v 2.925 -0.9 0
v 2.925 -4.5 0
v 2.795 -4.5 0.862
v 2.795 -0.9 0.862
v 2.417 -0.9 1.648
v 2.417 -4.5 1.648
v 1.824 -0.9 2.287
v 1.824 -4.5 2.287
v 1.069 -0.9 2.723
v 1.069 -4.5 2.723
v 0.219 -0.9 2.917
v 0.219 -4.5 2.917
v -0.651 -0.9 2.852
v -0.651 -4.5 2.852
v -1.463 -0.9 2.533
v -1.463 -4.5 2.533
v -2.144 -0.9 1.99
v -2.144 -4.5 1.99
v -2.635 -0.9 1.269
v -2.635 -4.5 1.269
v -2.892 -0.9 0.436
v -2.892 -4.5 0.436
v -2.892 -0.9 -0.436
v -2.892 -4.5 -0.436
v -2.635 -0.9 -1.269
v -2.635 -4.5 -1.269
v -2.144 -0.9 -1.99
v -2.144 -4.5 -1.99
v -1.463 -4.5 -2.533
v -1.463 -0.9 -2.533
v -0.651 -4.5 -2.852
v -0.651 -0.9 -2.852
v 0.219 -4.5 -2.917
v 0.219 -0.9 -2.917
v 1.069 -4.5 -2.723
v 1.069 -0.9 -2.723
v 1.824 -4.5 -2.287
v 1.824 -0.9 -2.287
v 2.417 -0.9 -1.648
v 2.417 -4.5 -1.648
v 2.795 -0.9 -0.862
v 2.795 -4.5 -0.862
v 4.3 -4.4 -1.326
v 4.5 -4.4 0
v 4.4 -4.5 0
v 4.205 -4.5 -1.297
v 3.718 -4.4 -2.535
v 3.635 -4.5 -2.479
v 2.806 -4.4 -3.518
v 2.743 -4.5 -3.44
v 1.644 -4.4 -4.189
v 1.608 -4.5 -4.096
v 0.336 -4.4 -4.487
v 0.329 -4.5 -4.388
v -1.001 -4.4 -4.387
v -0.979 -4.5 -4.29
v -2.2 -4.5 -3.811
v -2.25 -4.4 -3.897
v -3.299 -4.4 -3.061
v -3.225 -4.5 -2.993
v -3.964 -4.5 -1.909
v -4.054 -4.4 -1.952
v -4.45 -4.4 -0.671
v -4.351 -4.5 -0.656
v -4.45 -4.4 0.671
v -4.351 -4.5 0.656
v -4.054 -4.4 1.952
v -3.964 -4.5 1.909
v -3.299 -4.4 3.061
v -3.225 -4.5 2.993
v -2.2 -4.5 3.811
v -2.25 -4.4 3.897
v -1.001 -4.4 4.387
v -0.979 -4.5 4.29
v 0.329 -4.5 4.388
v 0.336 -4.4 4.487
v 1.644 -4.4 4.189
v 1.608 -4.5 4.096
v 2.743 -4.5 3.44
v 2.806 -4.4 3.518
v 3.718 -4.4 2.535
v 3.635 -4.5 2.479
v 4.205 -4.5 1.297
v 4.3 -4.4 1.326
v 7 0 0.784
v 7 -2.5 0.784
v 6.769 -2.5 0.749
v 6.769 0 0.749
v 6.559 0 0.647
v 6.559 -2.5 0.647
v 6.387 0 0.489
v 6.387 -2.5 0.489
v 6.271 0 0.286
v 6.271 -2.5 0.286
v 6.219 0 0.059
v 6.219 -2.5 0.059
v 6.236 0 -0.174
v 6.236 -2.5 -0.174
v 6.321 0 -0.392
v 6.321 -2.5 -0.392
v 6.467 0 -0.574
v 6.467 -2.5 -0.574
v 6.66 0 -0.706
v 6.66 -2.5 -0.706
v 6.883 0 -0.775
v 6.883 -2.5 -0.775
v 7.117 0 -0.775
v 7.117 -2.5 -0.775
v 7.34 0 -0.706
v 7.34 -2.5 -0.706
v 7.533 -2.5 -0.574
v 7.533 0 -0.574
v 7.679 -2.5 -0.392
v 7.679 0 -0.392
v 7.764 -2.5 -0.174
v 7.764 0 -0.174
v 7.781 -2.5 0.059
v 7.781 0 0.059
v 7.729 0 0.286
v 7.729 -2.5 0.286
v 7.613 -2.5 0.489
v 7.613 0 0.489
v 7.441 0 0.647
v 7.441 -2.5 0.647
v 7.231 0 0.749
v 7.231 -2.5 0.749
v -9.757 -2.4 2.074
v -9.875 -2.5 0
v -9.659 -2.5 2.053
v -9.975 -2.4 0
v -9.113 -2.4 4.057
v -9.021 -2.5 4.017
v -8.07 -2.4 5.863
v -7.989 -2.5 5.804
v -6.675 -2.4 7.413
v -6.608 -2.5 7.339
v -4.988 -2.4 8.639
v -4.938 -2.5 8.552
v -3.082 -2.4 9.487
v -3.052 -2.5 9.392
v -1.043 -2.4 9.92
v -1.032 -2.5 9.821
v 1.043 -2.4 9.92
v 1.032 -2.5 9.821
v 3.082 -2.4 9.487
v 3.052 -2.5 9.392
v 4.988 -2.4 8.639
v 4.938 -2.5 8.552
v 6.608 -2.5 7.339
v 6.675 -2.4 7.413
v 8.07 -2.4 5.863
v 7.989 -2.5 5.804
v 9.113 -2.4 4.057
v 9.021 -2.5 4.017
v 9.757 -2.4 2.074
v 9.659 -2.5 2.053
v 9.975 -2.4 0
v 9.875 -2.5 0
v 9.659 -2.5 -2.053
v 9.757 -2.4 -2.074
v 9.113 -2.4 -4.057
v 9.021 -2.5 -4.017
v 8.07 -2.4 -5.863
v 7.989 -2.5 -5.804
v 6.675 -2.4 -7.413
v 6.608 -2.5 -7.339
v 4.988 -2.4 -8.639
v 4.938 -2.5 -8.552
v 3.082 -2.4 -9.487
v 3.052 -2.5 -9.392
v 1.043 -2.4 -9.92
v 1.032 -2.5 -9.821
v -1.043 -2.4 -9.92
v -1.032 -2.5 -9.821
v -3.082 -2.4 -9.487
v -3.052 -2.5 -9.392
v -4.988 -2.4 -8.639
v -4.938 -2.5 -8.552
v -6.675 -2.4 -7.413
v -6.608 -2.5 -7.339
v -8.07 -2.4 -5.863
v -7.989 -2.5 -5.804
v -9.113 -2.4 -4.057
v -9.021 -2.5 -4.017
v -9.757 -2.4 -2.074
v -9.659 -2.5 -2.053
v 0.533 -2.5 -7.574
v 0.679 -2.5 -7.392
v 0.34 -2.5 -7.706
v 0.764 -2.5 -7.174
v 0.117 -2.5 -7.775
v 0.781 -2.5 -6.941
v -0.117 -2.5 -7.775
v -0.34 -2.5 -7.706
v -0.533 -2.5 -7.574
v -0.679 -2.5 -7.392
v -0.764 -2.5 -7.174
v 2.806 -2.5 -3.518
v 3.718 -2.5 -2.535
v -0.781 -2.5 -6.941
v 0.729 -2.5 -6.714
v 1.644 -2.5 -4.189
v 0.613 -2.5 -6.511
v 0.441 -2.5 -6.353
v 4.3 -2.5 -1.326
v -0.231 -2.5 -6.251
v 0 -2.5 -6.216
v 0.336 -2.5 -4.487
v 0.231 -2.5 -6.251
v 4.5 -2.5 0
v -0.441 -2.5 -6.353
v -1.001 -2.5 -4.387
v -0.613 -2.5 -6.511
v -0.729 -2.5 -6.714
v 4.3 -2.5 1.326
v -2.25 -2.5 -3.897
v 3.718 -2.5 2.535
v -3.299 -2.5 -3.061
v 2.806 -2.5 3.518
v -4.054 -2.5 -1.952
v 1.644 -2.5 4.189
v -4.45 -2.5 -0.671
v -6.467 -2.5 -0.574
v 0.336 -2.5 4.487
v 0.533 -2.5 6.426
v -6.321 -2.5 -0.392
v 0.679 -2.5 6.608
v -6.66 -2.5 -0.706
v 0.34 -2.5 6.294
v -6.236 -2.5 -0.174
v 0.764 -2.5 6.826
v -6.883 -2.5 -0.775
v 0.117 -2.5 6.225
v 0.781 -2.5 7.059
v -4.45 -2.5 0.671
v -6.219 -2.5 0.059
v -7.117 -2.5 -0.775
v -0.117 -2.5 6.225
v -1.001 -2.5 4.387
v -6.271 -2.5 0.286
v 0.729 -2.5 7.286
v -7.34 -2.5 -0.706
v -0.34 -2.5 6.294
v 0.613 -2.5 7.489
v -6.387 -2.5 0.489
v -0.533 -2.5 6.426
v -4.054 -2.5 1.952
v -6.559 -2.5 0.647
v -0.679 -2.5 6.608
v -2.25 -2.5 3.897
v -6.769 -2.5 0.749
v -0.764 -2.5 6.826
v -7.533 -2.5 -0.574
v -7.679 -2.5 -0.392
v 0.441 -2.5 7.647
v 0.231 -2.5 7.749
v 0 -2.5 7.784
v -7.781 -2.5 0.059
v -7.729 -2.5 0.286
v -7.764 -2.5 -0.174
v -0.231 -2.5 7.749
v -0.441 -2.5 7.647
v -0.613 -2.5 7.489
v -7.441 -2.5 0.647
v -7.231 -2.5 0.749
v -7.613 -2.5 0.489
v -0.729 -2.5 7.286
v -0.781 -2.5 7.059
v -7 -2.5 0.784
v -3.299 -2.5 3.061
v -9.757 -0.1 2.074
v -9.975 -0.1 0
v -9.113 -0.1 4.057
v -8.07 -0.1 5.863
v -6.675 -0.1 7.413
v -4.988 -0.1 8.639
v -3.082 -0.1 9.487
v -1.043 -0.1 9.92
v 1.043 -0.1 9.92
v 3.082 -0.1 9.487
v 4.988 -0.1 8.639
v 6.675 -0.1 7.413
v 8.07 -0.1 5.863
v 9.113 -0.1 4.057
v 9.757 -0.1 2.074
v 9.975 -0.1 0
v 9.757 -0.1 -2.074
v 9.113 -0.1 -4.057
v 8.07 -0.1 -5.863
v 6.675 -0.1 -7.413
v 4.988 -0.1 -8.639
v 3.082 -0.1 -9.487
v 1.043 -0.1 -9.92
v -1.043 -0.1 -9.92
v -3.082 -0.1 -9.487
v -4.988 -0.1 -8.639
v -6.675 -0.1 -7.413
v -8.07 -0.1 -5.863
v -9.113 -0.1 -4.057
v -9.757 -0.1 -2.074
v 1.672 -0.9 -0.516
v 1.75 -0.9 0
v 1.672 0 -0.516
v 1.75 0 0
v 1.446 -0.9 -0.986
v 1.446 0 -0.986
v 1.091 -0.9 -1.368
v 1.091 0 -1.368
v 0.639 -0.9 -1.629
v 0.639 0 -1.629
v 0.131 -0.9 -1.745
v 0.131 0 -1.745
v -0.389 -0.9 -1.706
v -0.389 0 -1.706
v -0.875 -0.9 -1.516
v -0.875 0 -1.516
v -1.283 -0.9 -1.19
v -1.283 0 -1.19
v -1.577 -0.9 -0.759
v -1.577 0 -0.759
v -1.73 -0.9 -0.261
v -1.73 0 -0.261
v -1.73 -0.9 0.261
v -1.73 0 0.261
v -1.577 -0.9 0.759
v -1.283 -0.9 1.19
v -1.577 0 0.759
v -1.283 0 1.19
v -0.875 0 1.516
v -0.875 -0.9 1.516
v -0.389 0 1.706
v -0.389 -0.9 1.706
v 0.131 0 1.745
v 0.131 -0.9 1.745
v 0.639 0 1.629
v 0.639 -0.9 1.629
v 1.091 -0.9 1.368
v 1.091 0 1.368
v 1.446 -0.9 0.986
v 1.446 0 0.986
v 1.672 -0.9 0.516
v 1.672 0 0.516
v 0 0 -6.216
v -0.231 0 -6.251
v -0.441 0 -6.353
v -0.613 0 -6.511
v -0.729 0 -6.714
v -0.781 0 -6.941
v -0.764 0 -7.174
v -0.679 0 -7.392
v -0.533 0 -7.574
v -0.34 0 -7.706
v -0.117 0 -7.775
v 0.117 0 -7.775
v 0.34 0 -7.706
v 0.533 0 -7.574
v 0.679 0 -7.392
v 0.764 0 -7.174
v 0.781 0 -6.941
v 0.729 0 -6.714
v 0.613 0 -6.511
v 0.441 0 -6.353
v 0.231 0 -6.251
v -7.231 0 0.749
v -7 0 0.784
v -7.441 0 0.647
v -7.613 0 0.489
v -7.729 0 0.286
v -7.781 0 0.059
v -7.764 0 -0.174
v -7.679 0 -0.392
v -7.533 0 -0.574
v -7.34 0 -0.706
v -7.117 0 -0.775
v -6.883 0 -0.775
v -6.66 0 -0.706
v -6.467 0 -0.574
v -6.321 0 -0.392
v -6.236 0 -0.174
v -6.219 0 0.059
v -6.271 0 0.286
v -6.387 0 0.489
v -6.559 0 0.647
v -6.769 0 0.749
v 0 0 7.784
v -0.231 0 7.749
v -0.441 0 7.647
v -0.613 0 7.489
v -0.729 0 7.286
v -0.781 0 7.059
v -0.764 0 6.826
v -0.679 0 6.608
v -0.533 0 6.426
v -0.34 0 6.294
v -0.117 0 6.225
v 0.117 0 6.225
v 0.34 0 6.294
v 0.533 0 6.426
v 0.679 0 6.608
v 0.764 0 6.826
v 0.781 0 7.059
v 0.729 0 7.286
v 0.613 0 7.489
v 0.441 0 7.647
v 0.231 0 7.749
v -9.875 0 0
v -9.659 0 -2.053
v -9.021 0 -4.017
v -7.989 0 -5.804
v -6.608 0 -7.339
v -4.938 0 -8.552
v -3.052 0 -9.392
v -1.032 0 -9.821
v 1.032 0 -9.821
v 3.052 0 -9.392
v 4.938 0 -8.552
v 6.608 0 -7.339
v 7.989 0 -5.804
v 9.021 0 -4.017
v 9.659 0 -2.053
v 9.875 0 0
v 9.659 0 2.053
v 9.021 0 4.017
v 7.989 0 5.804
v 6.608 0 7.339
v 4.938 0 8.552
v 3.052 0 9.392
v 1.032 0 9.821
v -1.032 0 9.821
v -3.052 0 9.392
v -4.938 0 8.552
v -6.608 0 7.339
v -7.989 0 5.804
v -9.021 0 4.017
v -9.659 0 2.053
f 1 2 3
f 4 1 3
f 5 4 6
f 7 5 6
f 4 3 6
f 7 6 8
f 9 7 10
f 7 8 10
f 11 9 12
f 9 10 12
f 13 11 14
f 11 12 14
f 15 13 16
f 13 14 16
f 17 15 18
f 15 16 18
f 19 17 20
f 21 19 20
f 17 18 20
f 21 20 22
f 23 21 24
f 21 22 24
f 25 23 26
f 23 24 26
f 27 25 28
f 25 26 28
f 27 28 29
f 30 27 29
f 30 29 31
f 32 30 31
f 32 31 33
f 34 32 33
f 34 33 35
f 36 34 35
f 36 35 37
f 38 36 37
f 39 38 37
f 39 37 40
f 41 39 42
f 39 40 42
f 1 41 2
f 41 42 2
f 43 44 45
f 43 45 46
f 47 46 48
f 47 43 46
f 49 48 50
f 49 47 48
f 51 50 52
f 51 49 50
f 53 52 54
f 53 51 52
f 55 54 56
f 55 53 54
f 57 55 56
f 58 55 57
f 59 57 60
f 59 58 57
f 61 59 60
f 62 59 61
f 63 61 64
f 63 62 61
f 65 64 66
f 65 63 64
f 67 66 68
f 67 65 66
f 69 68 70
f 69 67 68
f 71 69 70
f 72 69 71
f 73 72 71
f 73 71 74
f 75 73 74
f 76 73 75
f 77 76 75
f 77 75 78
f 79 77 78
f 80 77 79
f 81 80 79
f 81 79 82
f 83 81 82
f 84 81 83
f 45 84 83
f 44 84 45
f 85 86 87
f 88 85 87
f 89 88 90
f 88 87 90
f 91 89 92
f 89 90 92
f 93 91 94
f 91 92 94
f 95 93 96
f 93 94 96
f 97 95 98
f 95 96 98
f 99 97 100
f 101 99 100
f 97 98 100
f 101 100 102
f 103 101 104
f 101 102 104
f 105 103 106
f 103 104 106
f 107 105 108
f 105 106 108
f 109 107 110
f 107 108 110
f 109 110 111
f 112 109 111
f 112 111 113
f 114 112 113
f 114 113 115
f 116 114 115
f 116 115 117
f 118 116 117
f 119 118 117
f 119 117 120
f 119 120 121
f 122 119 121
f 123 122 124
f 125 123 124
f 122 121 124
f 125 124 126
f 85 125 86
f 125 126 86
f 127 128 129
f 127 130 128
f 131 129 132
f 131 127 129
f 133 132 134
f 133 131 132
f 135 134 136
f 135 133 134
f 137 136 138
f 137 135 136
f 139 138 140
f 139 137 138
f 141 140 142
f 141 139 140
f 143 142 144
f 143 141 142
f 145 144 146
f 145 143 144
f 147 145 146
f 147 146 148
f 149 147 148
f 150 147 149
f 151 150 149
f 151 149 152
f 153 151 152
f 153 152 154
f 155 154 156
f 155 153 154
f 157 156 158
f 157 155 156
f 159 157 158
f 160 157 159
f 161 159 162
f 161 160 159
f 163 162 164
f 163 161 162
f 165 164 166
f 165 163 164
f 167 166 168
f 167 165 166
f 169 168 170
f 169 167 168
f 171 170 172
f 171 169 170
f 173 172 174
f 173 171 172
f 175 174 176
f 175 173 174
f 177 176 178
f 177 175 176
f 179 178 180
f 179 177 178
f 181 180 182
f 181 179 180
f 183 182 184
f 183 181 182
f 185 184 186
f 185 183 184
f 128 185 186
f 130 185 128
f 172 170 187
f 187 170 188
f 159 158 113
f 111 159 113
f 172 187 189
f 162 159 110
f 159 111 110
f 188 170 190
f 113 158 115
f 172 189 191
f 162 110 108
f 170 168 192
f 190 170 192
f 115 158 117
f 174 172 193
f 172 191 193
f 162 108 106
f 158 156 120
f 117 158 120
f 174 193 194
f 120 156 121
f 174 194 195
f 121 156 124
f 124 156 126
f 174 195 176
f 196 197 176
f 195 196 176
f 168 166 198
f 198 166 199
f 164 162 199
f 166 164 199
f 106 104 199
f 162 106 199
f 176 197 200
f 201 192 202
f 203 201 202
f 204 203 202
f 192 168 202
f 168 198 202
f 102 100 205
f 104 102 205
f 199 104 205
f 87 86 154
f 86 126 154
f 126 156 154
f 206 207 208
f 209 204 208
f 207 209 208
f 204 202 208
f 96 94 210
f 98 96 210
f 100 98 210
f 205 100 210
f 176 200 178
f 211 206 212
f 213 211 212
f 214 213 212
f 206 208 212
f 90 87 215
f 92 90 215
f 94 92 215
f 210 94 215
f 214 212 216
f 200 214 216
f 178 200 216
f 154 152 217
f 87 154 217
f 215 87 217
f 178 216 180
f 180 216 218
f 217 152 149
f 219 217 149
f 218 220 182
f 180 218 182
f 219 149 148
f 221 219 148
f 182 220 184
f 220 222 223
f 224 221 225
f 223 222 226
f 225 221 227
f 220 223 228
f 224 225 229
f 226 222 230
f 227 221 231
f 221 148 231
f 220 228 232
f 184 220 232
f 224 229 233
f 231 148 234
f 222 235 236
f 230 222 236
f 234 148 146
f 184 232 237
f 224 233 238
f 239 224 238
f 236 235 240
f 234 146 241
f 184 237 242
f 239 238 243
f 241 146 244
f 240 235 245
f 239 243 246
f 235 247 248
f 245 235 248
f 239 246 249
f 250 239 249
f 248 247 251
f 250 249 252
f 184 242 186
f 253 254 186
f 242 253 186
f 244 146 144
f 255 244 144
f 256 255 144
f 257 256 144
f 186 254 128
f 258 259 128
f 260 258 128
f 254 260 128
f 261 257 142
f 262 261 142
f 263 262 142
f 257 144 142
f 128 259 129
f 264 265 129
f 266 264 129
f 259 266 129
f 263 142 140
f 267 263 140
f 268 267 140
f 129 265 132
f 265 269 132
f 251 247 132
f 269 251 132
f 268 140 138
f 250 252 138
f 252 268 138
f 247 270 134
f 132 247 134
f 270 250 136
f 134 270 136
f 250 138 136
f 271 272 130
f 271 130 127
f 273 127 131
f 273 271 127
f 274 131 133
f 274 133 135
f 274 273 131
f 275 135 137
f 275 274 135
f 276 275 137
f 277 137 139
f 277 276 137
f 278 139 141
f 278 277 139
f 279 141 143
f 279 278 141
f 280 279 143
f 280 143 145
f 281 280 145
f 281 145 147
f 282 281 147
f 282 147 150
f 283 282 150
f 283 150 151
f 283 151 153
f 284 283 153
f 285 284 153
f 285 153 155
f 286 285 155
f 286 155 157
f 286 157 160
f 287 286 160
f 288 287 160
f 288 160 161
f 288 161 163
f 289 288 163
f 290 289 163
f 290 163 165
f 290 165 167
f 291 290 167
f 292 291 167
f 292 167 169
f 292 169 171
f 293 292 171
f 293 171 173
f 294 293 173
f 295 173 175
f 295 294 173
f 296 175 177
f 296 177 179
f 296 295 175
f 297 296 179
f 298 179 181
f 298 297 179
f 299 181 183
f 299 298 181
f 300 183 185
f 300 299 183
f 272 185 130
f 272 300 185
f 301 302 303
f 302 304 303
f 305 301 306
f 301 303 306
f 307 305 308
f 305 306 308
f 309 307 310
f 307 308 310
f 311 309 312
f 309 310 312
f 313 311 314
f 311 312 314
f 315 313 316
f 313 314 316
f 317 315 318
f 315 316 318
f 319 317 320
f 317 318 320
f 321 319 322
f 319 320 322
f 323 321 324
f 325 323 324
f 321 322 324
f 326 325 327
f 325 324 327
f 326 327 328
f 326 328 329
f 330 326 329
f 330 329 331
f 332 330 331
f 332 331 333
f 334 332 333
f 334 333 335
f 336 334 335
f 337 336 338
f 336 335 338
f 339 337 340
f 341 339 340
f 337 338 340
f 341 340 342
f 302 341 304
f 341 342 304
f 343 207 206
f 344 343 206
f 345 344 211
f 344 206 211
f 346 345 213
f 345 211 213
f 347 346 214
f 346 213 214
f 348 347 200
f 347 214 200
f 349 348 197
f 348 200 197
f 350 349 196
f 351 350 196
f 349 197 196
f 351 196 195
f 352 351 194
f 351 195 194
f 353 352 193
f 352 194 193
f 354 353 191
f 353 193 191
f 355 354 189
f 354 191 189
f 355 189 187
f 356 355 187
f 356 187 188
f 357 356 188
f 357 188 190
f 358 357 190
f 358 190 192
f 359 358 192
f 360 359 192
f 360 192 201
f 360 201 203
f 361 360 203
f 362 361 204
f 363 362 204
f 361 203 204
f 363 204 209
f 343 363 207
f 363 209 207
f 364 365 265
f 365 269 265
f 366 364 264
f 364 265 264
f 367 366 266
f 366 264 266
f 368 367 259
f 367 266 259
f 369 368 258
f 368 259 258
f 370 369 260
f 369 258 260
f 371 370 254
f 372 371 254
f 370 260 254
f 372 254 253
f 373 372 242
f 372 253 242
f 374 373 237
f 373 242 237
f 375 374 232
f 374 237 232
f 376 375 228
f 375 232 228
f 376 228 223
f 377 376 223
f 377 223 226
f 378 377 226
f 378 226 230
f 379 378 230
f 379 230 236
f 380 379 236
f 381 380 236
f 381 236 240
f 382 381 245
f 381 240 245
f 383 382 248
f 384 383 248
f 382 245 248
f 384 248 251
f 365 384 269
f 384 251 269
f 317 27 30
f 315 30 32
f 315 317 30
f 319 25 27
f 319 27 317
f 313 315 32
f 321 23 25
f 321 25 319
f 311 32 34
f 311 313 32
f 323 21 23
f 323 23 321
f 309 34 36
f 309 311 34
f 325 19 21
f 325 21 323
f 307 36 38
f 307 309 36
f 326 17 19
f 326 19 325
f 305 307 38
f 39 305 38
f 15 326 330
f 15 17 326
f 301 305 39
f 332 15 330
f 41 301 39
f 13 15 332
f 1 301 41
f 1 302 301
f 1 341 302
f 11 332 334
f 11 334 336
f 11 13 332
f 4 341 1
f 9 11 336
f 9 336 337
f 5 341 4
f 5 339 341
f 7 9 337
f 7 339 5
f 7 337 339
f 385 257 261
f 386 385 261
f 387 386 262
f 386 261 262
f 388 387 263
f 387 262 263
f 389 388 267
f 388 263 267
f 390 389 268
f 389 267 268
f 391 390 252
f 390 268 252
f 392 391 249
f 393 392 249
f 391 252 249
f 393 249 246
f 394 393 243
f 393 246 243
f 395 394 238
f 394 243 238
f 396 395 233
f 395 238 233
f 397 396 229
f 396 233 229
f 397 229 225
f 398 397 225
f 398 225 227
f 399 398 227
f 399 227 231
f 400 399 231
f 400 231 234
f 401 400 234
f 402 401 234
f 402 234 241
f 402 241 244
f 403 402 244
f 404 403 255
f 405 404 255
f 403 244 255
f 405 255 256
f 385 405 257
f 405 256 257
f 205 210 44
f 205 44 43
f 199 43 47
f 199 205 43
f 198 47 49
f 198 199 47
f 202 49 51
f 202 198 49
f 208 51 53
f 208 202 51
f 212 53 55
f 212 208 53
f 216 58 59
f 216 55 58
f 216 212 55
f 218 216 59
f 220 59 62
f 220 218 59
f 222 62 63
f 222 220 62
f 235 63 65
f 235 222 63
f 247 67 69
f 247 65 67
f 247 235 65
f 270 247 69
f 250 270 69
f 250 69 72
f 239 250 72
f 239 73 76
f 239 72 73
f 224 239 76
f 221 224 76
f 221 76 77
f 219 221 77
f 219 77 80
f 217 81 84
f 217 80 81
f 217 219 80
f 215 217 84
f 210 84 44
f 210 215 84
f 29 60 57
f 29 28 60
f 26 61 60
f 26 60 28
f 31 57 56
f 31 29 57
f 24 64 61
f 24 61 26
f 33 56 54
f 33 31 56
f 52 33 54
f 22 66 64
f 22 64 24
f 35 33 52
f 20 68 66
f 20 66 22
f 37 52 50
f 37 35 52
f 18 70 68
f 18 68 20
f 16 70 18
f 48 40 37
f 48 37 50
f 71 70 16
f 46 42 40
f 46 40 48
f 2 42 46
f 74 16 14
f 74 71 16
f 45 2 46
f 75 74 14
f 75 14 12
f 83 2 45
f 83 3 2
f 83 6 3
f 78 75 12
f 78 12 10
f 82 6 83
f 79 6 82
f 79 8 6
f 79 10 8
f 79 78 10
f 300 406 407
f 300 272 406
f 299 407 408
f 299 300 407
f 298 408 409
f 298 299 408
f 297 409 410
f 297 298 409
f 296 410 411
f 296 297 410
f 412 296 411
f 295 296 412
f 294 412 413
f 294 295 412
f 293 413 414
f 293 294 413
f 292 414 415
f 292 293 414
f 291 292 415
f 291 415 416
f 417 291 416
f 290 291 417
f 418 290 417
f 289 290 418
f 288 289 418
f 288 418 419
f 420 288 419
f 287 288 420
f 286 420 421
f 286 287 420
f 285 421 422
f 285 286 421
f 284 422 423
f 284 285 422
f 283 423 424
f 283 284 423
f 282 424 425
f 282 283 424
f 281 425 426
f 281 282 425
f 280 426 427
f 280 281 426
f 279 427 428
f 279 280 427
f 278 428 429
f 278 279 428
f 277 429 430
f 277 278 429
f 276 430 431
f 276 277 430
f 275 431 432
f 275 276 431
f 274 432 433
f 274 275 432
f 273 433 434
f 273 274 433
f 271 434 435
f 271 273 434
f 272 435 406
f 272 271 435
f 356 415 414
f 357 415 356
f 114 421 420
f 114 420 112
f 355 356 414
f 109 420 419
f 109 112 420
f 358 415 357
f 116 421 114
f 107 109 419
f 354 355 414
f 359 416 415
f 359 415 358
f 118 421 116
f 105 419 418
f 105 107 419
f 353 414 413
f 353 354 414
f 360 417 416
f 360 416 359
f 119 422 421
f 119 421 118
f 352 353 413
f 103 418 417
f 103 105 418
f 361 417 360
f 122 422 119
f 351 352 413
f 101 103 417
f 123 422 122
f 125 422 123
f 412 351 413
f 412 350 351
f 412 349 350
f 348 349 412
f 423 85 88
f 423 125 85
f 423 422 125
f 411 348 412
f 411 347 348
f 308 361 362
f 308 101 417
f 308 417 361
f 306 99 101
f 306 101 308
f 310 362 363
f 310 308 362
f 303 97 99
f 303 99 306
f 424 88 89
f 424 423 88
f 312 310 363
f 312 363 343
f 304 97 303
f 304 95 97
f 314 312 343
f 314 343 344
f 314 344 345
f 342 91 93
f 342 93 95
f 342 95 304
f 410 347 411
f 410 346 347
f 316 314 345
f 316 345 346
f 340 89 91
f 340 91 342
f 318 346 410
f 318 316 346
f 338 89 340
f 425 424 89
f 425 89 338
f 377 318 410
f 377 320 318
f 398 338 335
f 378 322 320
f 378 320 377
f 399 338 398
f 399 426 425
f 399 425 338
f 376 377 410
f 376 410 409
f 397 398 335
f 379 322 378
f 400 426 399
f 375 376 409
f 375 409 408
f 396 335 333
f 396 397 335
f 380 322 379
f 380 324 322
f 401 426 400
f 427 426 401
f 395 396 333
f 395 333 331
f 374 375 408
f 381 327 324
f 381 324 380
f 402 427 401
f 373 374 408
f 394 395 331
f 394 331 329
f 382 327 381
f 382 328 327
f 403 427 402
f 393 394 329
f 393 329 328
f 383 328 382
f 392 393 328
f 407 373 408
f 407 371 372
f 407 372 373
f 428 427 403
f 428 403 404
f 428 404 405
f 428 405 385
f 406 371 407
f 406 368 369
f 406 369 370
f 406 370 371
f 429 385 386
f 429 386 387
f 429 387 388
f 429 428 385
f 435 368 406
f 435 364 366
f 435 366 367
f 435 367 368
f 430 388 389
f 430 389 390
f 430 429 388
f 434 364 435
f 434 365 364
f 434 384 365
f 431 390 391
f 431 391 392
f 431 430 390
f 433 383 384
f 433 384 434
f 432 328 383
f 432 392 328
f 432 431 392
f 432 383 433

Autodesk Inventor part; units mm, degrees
ref_plane "YZ Plane" through (0, 0, 0) normal (1, 0, 0) x (0, 1, 0)
ref_plane "XZ Plane" through (0, 0, 0) normal (0, 1, 0) x (-1, 0, 0)
ref_plane "XY Plane" through (0, 0, 0) normal (0, 0, 1) x (1, 0, 0)
sketch "Sketch5" plane through (0, 0, 0) normal (0, 1, 0) x (-1, 0, 0)
  circle A0 centre (0, 0) radius 9.975
  dimension "d20" = 19.95
extrude "Extrusion4" add sketch "Sketch5" against normal blind 2.5
sketch "Sketch6" plane through (0, -2.5, 0) normal (0, -1, 0) x (1, 0, 0)
  circle A0 centre (0, 0) radius 4.5
  dimension "d23" = 9
extrude "Extrusion5" add sketch "Sketch6" along normal blind 2
sketch "Sketch7" plane through (0, -4.5, 0) normal (0, -1, 0) x (1, 0, 0)
  circle A0 centre (0, 0) radius 2.925
  dimension "d26" = 5.85
extrude "Extrusion6" cut sketch "Sketch7" against normal blind 3.6
sketch "Sketch8" plane through (0, 0, 0) normal (0, 1, 0) x (1, 0, 0)
  circle A0 centre (0, 0) radius 1.75
  dimension "d29" = 3.5
extrude "Extrusion7" cut sketch "Sketch8" against normal through all
sketch "Sketch9" plane through (0, 0, 0) normal (0, 1, 0) x (1, 0, 0)
  circle A0 centre (0, 0) radius 7
  point P0 (-7, 0)
  point P1 (7, 0)
  point P2 (0, 7)
  point P3 (0, -7)
  dimension "d32" = 14
hole "Hole2" at (-7, 0, 0) at (7, 0, 0) at (0, 0, -7) at (0, 0, 7) direction (0, -1, 0) diameter 1.567 end through all thread size "M2x0.4" class "6H" standard "ISO Metric profile"
chamfer "Chamfer2" distance 0.1 angle 45 3 edges at (9.975, 0, 0) (9.975, -2.5, 0) (-4.5, -4.5, 0)
properties part number "Top Horn" material "Aluminum 6061"
